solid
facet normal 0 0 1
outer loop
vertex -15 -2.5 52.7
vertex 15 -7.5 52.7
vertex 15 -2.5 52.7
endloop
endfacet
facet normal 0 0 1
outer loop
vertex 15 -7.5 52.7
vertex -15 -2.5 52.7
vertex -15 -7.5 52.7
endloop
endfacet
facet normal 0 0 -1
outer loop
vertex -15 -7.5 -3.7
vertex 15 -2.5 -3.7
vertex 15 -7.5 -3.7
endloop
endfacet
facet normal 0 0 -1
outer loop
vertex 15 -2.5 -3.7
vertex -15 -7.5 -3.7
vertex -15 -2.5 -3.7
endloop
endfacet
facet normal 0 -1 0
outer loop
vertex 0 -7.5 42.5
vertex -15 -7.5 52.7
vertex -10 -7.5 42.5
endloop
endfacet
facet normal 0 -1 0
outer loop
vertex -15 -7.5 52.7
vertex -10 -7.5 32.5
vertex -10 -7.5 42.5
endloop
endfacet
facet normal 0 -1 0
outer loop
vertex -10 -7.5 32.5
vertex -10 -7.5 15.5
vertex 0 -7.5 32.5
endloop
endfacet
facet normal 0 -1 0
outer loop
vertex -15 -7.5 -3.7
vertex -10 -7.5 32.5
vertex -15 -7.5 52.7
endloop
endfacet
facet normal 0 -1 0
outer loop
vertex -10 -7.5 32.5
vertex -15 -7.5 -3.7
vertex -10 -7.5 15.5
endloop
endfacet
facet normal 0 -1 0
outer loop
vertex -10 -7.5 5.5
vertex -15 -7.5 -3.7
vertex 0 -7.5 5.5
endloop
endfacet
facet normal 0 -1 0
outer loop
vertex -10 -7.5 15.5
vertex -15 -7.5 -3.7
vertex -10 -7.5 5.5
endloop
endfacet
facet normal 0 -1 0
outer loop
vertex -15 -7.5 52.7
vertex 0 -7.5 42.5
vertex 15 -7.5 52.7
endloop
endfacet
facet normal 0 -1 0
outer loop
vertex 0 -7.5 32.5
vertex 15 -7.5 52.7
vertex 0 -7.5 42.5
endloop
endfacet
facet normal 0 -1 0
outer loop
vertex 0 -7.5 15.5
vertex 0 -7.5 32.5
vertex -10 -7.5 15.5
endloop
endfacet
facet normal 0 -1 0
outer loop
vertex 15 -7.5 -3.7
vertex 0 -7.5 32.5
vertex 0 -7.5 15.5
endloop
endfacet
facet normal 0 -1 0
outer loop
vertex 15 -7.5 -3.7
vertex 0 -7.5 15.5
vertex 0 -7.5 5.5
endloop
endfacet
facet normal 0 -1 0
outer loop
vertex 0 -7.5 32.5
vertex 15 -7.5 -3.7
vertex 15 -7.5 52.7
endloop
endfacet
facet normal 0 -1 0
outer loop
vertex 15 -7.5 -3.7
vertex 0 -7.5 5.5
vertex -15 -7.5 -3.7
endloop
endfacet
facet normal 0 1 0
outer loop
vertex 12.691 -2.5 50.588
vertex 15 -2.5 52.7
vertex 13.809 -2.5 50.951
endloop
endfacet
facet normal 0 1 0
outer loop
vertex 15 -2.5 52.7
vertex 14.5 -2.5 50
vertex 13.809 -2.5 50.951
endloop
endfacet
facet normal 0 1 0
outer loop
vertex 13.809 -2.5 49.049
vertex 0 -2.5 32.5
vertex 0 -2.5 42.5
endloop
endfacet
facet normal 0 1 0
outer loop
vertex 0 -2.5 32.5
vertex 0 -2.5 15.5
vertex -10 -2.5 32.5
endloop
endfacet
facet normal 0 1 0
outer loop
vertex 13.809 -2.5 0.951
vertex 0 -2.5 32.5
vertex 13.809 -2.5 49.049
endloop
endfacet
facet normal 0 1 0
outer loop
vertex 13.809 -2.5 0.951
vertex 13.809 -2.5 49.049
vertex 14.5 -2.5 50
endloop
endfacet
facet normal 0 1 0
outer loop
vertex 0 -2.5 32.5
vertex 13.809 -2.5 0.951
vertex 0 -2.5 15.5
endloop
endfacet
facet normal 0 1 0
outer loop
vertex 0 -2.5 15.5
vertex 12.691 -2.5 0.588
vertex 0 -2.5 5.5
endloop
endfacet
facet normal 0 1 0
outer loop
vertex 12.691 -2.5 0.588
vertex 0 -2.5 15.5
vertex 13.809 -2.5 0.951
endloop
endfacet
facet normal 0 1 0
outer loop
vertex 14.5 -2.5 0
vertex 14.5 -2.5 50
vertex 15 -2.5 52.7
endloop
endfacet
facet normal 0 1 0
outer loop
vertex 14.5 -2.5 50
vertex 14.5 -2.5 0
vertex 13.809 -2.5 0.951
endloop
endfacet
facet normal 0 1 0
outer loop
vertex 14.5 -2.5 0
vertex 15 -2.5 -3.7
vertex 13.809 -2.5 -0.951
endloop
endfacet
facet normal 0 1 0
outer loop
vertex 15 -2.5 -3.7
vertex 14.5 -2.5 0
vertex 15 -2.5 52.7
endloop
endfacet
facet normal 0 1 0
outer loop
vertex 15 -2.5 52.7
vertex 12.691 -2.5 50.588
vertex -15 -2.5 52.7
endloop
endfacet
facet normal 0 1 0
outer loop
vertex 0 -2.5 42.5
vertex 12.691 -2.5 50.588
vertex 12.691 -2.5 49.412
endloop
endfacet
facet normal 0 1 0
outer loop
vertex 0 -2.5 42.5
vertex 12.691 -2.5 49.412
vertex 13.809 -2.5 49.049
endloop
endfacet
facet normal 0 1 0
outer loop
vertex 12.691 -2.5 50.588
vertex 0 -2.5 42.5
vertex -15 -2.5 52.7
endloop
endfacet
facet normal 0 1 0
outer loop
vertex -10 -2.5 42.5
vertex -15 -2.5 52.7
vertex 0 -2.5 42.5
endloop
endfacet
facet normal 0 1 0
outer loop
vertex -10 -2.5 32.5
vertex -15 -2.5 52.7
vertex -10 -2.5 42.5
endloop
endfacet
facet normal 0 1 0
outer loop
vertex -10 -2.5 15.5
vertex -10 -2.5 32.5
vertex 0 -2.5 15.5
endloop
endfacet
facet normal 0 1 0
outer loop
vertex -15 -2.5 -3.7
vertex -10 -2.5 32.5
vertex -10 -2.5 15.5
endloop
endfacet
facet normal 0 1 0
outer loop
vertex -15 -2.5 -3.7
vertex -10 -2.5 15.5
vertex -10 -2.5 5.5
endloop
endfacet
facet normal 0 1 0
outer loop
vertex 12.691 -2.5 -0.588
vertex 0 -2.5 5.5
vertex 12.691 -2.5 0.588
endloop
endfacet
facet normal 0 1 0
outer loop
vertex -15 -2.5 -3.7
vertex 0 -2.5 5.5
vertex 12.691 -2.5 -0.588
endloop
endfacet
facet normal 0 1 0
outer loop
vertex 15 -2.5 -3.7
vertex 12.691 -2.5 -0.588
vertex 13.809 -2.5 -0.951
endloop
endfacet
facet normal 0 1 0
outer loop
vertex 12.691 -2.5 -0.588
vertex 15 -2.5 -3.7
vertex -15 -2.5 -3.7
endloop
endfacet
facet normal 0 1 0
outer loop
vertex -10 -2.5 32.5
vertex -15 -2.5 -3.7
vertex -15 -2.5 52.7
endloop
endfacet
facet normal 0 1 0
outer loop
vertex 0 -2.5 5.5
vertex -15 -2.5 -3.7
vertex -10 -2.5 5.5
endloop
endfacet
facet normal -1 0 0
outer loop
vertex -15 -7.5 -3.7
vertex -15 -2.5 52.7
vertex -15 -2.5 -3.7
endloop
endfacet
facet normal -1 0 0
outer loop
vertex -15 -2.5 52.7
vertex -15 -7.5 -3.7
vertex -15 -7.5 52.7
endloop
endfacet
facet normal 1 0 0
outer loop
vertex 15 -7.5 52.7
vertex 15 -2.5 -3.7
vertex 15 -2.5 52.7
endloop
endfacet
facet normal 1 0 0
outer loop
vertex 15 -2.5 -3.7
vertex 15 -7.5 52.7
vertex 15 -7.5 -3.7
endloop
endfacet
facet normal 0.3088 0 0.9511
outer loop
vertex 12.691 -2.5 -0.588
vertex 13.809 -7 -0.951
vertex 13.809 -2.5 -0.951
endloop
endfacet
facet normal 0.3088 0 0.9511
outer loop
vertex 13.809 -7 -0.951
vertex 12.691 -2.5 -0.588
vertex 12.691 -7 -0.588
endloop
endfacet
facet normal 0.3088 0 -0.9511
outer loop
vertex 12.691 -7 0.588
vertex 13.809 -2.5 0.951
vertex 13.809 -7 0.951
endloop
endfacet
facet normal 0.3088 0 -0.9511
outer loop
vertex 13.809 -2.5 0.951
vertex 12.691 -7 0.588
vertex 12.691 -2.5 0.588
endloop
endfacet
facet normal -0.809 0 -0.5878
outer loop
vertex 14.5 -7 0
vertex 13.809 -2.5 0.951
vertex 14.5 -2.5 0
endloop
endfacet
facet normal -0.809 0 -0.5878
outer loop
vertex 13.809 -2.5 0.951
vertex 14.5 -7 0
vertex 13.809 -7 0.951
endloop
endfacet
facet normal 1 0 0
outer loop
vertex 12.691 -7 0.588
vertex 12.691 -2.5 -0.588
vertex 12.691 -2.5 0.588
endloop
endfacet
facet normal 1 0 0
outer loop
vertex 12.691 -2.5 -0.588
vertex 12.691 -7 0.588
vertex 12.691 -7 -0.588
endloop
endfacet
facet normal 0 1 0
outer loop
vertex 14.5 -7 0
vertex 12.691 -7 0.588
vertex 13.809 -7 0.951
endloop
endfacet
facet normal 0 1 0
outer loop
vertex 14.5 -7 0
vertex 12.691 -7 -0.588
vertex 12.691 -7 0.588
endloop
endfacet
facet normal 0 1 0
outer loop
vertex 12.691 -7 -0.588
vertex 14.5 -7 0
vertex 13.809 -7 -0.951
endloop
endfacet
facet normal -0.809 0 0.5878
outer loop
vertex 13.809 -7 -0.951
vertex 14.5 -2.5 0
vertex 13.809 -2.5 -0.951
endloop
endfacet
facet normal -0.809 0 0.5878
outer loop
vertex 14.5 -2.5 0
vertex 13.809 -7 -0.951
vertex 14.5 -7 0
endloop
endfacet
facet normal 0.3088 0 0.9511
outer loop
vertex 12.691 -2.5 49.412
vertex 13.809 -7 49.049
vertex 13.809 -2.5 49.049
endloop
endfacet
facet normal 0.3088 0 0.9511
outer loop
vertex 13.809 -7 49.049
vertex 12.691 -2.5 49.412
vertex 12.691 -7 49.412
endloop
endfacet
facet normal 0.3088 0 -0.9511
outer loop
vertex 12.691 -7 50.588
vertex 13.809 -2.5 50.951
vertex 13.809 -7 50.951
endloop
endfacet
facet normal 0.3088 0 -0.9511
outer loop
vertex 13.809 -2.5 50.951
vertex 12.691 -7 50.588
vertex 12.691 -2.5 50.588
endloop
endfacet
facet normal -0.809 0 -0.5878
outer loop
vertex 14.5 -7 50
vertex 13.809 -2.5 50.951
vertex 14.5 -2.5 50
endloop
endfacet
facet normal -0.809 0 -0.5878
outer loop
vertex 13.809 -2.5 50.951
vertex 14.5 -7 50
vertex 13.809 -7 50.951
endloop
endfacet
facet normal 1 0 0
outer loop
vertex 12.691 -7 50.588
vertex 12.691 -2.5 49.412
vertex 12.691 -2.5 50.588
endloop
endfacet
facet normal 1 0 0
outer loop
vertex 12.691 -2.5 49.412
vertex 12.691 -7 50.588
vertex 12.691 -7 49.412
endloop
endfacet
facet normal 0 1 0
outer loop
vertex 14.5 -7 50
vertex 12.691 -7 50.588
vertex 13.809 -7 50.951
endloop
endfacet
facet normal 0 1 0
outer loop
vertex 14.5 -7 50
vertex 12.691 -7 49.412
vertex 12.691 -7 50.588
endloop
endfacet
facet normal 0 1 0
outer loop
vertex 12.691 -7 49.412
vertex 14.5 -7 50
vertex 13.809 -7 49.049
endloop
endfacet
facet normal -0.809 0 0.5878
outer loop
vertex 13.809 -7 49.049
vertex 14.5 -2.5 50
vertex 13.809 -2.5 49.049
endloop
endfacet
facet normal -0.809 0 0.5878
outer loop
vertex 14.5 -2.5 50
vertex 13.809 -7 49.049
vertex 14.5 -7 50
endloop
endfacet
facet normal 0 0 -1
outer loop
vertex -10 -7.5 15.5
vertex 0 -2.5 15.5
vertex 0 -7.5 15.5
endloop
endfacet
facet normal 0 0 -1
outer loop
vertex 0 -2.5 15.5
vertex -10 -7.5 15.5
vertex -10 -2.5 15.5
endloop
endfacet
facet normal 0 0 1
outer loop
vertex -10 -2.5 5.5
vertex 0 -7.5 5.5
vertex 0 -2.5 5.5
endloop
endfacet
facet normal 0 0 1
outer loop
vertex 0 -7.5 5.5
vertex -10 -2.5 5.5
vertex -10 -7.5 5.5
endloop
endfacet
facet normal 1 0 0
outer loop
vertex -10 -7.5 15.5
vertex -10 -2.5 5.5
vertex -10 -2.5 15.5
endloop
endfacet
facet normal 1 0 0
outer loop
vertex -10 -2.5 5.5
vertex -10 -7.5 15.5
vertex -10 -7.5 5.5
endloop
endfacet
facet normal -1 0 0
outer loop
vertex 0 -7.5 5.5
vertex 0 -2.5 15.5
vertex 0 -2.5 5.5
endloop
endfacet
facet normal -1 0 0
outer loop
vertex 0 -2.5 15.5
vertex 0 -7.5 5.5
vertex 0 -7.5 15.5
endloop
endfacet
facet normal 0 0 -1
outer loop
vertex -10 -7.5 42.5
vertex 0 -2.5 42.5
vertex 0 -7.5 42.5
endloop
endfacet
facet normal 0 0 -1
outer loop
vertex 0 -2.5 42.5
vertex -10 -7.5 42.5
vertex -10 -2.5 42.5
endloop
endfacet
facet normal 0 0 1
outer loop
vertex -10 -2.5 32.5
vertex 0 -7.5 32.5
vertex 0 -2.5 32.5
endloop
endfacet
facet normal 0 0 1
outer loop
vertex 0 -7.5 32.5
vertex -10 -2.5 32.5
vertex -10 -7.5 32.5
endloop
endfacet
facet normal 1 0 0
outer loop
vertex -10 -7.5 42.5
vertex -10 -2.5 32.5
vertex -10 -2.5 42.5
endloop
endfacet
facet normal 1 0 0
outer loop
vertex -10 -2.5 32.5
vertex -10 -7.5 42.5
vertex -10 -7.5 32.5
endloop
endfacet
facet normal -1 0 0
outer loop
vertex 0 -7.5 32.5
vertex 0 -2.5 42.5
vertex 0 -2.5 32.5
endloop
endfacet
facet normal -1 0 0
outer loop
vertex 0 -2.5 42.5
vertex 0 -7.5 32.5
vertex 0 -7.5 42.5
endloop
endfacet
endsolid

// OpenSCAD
//difference(){
//
//rotate([90,90,0])
//    translate([-24.5,0,0])
//        scale([56.4,30,5])
//            cube([1,1,1],center=true);
//
//rotate([90,90,0])
//    translate([-24.5,0,2.0])
//        cube([50,25,15],center=true);
//rotate([90,90,0])
//    translate([-24.5,-15,0])
//        scale([20,15,10])
//            cube([1,1,1],center=true);
//}


difference(){
    rotate([90,90,0])
        translate([-24.5,0,5])
            scale([56.4,30,5])
                cube([1,1,1],center=true);
    rotate([90,0,0])
        translate([13.5,0,2])
            cylinder(5,1,1);

    rotate([90,0,0])
        translate([13.5,50,2])
            cylinder(5,1,1);
    rotate([90,90,0])
        translate([-10.5,-5,0])
            scale([10,10,20])
            cube([1,1,1],center=true);
    rotate([90,90,0])
        translate([-37.5,-5,0])
            scale([10,10,20])
                cube([1,1,1],center=true);



}
